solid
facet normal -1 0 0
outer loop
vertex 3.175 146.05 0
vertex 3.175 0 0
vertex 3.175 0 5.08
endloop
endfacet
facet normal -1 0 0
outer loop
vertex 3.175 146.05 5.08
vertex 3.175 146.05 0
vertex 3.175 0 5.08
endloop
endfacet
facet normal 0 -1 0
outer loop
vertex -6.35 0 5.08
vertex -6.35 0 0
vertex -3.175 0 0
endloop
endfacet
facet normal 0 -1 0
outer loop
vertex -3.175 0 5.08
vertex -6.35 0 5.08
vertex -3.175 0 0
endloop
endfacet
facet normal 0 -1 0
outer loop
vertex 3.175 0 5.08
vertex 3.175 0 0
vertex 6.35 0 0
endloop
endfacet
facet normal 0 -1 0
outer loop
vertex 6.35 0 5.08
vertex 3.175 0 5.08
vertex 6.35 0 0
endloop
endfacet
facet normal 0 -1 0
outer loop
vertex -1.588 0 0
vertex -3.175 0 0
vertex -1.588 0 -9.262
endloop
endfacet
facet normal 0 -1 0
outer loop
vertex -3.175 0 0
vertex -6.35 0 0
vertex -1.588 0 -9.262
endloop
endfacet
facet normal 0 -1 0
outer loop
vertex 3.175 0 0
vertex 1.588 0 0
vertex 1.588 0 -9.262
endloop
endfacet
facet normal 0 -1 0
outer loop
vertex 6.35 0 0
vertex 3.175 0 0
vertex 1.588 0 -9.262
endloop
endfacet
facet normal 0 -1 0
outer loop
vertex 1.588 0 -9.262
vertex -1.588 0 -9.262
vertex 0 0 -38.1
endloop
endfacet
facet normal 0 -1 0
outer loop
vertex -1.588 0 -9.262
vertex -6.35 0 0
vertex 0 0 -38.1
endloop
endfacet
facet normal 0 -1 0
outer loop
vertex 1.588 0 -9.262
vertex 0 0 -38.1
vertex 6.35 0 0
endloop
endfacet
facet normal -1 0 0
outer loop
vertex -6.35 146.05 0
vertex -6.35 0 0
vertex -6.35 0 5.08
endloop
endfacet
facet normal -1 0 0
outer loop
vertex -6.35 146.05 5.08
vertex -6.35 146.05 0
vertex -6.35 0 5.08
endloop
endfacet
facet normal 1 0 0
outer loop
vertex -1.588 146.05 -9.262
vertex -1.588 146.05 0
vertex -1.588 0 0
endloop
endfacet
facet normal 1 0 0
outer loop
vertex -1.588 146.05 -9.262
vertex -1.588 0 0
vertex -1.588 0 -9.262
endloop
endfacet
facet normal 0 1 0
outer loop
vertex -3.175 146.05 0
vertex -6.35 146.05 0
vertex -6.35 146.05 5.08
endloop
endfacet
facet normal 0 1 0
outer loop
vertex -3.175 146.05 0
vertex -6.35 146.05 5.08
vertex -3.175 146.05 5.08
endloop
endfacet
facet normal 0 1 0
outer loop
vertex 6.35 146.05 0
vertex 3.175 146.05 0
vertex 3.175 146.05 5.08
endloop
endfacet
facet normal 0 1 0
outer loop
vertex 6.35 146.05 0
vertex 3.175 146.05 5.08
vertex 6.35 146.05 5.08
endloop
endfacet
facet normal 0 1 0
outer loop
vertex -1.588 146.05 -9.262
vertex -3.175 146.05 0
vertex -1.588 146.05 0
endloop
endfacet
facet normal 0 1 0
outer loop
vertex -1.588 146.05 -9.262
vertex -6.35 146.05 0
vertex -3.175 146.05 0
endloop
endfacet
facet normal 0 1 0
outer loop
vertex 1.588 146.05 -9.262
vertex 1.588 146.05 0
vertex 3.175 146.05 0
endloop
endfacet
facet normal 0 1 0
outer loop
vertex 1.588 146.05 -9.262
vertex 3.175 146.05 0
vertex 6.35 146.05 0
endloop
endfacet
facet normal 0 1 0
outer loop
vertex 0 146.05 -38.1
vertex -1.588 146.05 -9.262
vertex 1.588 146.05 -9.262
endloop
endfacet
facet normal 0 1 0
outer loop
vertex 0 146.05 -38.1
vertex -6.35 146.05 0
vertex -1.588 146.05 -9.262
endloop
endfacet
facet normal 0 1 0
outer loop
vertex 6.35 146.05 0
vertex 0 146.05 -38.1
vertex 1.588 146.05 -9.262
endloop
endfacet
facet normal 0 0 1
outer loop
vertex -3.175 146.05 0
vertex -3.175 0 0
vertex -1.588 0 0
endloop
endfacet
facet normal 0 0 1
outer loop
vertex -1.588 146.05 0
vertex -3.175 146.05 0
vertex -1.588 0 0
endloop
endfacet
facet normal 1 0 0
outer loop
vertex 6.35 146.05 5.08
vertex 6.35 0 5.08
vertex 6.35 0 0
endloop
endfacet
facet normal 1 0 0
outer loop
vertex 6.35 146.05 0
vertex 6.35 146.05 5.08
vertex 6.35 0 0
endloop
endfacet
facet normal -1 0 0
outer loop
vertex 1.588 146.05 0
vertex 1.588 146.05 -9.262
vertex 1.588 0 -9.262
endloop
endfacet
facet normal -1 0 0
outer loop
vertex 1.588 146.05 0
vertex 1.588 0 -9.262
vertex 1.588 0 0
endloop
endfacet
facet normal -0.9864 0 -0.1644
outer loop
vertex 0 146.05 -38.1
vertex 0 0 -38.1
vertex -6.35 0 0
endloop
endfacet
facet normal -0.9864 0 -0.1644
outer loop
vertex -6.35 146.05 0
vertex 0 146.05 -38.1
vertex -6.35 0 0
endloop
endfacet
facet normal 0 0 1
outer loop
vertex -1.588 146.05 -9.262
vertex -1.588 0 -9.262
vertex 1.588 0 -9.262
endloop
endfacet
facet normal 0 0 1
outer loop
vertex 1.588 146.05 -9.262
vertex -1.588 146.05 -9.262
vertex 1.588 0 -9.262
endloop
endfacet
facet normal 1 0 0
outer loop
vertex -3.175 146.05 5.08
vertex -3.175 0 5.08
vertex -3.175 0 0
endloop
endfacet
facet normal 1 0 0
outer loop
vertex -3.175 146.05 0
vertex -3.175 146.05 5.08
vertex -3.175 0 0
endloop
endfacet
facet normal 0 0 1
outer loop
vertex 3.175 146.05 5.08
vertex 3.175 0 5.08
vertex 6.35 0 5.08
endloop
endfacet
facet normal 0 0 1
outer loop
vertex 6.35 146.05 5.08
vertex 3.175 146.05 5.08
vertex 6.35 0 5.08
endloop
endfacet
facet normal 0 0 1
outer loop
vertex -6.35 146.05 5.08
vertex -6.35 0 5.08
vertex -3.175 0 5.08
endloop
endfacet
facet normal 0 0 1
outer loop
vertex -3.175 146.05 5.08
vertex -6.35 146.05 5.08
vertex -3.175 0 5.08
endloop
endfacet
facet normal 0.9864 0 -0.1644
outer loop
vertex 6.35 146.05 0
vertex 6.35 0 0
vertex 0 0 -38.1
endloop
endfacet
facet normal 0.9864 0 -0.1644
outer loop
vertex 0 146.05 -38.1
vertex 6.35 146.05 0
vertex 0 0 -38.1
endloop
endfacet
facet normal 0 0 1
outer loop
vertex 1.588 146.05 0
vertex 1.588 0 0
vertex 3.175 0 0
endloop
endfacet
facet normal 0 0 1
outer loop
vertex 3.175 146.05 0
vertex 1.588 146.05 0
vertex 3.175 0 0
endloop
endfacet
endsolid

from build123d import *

# Parameters (mm, degrees)
BOSS_EXTRUDE1_DEPTH = 146.05


with BuildPart() as part:
    # Sketch1 → Boss-Extrude1 (new body)
    with BuildSketch(Plane(origin=(0, 0, 0), x_dir=(1, 0, 0), z_dir=(0, 1, 0))):
        Polygon((0, 38.1), (-6.35, 0), (-6.35, -5.08), (-3.175, -5.08), (-3.175, 0), (-1.5875, 0), (-1.5875, 9.262228966), (1.5875, 9.262228966), (1.5875, 0), (3.175, 0), (3.175, -5.08), (6.35, -5.08), (6.35, 0), align=None)
    extrude(amount=BOSS_EXTRUDE1_DEPTH)


solid = part.part
